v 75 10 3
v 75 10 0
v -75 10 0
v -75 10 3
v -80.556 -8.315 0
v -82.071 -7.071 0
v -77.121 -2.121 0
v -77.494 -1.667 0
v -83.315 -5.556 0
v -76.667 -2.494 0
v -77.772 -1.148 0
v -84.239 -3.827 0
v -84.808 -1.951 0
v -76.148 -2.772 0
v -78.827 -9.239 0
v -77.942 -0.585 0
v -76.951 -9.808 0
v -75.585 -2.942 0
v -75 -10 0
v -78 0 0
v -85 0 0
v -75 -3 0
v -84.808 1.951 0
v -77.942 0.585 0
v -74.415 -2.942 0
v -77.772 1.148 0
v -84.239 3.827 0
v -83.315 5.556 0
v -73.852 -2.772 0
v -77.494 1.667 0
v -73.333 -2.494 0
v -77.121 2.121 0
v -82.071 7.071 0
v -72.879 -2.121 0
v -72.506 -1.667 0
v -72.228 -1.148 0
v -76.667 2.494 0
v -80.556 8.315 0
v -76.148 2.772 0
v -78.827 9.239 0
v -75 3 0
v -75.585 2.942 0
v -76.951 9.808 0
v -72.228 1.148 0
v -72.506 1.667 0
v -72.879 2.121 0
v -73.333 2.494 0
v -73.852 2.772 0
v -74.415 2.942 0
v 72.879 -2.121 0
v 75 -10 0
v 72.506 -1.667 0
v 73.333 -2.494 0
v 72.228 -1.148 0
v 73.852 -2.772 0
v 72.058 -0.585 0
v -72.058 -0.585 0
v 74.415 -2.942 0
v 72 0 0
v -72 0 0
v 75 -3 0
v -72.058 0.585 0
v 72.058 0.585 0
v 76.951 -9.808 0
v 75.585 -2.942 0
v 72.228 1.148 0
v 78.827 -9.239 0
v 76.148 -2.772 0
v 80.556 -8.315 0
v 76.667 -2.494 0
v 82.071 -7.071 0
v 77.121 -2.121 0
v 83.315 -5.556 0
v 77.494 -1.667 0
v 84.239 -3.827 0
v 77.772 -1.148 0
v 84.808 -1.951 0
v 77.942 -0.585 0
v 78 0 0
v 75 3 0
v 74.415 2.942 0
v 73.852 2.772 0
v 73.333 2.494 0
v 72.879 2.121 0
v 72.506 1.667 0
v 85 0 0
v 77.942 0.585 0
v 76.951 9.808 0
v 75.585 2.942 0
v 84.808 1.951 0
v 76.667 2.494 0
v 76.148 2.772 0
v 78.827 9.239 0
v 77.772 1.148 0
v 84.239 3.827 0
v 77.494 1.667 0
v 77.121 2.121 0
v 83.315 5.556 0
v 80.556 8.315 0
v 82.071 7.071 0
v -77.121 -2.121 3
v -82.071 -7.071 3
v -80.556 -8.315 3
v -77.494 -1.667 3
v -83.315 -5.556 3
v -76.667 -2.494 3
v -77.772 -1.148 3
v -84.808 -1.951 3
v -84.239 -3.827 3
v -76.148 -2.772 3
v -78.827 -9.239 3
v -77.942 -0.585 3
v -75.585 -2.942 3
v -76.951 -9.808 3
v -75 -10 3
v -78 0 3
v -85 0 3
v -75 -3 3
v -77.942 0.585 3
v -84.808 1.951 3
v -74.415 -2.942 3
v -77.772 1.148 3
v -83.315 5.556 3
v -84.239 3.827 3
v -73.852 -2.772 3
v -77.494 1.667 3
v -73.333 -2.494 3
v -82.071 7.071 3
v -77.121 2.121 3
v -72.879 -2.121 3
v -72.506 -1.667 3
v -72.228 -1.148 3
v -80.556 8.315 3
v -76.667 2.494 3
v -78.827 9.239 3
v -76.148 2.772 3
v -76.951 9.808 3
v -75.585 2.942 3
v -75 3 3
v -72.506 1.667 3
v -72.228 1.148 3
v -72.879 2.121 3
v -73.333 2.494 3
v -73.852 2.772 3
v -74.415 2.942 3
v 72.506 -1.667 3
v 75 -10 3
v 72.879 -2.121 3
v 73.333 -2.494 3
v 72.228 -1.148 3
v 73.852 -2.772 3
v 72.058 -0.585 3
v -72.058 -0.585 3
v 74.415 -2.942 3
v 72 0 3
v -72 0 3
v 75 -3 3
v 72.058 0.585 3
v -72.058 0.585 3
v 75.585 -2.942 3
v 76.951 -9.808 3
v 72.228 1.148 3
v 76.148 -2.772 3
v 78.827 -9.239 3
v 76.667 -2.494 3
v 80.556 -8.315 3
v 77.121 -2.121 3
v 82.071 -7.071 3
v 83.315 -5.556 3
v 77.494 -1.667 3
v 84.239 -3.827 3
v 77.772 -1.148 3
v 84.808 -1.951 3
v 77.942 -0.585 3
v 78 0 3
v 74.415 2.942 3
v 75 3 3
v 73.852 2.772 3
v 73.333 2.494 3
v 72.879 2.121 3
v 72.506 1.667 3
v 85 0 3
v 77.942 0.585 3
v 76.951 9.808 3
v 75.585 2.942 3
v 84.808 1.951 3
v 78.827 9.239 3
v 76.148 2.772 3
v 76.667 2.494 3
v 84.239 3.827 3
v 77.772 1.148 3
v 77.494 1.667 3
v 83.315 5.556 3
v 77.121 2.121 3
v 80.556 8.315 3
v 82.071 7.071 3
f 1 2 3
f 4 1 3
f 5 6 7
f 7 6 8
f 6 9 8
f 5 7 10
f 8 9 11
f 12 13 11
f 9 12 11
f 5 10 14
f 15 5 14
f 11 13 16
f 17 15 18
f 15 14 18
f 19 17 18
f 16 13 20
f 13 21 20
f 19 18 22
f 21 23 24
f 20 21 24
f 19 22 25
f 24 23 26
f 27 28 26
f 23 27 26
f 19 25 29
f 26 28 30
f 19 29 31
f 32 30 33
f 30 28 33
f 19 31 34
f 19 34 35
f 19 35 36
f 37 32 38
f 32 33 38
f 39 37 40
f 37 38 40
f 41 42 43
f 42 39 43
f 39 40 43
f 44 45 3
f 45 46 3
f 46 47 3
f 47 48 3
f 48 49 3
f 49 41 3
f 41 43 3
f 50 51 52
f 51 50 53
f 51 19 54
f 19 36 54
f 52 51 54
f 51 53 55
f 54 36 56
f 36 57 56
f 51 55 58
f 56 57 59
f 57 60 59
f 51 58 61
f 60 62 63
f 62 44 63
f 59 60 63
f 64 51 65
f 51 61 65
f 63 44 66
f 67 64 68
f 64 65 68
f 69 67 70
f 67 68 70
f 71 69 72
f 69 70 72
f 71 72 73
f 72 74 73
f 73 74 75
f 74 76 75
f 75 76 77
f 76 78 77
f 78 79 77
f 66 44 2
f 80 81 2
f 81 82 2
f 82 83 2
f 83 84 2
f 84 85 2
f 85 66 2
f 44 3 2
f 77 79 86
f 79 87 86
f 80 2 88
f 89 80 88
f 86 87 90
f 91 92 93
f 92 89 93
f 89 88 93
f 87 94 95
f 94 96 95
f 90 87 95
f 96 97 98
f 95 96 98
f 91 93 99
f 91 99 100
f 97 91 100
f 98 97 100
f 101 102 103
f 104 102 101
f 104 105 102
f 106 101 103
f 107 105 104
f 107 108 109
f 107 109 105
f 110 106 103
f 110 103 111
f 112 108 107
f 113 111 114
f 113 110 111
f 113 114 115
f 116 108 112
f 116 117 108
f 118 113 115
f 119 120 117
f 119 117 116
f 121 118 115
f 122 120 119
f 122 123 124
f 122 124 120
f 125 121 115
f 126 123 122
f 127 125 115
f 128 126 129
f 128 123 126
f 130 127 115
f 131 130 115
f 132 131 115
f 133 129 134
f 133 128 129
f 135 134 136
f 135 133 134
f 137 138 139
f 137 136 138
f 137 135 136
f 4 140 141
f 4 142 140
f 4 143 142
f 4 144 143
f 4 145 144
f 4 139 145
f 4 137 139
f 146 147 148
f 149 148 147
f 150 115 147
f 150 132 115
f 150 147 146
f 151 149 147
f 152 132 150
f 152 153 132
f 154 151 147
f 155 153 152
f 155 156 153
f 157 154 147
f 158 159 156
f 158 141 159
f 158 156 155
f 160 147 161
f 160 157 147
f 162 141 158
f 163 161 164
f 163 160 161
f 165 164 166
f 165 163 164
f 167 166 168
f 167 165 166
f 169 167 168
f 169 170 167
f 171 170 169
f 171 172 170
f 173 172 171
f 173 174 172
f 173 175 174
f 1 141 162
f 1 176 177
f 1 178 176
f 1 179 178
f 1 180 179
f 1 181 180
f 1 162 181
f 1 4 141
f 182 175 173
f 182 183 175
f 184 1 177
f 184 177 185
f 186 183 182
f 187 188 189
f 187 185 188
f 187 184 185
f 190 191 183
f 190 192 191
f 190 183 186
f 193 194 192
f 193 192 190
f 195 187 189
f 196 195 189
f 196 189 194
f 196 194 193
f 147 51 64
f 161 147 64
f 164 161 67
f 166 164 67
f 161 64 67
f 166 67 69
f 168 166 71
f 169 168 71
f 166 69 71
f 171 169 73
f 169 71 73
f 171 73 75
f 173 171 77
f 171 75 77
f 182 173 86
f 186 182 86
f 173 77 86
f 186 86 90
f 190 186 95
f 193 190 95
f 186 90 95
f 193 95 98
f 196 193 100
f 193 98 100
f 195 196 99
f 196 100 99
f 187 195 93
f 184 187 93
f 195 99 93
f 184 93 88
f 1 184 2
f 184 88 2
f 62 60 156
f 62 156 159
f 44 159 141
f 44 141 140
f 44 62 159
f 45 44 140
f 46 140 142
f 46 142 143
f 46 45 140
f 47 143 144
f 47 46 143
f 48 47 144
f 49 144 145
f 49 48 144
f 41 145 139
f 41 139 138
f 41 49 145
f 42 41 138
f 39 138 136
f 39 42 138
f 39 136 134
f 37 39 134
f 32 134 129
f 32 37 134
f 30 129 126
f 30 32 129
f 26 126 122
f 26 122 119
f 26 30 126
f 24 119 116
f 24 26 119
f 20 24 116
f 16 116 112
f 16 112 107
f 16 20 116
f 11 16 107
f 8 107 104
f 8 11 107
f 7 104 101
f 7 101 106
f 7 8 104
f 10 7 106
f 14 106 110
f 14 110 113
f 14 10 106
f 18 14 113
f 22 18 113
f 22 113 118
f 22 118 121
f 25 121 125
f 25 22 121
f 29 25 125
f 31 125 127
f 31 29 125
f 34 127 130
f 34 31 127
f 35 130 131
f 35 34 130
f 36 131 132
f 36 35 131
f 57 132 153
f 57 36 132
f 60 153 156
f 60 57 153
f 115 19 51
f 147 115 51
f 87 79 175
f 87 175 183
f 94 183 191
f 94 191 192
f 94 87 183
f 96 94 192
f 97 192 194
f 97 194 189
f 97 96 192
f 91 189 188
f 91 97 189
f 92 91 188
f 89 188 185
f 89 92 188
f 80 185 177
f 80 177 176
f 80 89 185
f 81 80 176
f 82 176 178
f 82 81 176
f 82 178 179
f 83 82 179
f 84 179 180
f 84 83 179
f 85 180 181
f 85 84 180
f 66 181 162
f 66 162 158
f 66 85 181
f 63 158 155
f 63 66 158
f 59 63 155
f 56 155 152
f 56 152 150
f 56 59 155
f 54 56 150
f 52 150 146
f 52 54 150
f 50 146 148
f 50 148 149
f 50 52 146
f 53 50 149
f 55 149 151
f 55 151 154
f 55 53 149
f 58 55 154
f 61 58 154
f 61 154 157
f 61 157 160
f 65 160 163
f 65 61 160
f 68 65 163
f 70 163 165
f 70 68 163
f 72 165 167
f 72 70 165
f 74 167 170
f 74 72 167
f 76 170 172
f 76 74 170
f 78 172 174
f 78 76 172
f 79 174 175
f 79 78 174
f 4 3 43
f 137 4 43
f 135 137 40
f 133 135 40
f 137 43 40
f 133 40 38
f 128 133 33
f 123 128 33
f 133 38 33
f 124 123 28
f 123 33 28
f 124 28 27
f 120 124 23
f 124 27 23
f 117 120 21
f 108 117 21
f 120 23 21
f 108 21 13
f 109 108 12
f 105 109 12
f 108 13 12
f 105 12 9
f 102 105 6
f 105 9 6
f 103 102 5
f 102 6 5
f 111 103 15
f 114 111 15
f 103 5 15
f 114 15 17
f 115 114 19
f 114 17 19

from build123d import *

# Parameters (mm, degrees)
SKETCH1_R           = 3
BOSS_EXTRUDE1_DEPTH = 3


with BuildPart() as part:
    # Sketch1 → Boss-Extrude1 (new body)
    with BuildSketch(Plane.XY):
        with BuildLine():
            Line((-75, -10), (75, -10))
            ThreePointArc((75, -10), (85, 0), (75, 10))
            Line((75, 10), (-75, 10))
            ThreePointArc((-75, 10), (-85, 0), (-75, -10))
        make_face()
        with Locations((-75, 0)):
            Circle(SKETCH1_R, mode=Mode.SUBTRACT)
        with Locations((75, 0)):
            Circle(SKETCH1_R, mode=Mode.SUBTRACT)
    extrude(amount=BOSS_EXTRUDE1_DEPTH)


solid = part.part
